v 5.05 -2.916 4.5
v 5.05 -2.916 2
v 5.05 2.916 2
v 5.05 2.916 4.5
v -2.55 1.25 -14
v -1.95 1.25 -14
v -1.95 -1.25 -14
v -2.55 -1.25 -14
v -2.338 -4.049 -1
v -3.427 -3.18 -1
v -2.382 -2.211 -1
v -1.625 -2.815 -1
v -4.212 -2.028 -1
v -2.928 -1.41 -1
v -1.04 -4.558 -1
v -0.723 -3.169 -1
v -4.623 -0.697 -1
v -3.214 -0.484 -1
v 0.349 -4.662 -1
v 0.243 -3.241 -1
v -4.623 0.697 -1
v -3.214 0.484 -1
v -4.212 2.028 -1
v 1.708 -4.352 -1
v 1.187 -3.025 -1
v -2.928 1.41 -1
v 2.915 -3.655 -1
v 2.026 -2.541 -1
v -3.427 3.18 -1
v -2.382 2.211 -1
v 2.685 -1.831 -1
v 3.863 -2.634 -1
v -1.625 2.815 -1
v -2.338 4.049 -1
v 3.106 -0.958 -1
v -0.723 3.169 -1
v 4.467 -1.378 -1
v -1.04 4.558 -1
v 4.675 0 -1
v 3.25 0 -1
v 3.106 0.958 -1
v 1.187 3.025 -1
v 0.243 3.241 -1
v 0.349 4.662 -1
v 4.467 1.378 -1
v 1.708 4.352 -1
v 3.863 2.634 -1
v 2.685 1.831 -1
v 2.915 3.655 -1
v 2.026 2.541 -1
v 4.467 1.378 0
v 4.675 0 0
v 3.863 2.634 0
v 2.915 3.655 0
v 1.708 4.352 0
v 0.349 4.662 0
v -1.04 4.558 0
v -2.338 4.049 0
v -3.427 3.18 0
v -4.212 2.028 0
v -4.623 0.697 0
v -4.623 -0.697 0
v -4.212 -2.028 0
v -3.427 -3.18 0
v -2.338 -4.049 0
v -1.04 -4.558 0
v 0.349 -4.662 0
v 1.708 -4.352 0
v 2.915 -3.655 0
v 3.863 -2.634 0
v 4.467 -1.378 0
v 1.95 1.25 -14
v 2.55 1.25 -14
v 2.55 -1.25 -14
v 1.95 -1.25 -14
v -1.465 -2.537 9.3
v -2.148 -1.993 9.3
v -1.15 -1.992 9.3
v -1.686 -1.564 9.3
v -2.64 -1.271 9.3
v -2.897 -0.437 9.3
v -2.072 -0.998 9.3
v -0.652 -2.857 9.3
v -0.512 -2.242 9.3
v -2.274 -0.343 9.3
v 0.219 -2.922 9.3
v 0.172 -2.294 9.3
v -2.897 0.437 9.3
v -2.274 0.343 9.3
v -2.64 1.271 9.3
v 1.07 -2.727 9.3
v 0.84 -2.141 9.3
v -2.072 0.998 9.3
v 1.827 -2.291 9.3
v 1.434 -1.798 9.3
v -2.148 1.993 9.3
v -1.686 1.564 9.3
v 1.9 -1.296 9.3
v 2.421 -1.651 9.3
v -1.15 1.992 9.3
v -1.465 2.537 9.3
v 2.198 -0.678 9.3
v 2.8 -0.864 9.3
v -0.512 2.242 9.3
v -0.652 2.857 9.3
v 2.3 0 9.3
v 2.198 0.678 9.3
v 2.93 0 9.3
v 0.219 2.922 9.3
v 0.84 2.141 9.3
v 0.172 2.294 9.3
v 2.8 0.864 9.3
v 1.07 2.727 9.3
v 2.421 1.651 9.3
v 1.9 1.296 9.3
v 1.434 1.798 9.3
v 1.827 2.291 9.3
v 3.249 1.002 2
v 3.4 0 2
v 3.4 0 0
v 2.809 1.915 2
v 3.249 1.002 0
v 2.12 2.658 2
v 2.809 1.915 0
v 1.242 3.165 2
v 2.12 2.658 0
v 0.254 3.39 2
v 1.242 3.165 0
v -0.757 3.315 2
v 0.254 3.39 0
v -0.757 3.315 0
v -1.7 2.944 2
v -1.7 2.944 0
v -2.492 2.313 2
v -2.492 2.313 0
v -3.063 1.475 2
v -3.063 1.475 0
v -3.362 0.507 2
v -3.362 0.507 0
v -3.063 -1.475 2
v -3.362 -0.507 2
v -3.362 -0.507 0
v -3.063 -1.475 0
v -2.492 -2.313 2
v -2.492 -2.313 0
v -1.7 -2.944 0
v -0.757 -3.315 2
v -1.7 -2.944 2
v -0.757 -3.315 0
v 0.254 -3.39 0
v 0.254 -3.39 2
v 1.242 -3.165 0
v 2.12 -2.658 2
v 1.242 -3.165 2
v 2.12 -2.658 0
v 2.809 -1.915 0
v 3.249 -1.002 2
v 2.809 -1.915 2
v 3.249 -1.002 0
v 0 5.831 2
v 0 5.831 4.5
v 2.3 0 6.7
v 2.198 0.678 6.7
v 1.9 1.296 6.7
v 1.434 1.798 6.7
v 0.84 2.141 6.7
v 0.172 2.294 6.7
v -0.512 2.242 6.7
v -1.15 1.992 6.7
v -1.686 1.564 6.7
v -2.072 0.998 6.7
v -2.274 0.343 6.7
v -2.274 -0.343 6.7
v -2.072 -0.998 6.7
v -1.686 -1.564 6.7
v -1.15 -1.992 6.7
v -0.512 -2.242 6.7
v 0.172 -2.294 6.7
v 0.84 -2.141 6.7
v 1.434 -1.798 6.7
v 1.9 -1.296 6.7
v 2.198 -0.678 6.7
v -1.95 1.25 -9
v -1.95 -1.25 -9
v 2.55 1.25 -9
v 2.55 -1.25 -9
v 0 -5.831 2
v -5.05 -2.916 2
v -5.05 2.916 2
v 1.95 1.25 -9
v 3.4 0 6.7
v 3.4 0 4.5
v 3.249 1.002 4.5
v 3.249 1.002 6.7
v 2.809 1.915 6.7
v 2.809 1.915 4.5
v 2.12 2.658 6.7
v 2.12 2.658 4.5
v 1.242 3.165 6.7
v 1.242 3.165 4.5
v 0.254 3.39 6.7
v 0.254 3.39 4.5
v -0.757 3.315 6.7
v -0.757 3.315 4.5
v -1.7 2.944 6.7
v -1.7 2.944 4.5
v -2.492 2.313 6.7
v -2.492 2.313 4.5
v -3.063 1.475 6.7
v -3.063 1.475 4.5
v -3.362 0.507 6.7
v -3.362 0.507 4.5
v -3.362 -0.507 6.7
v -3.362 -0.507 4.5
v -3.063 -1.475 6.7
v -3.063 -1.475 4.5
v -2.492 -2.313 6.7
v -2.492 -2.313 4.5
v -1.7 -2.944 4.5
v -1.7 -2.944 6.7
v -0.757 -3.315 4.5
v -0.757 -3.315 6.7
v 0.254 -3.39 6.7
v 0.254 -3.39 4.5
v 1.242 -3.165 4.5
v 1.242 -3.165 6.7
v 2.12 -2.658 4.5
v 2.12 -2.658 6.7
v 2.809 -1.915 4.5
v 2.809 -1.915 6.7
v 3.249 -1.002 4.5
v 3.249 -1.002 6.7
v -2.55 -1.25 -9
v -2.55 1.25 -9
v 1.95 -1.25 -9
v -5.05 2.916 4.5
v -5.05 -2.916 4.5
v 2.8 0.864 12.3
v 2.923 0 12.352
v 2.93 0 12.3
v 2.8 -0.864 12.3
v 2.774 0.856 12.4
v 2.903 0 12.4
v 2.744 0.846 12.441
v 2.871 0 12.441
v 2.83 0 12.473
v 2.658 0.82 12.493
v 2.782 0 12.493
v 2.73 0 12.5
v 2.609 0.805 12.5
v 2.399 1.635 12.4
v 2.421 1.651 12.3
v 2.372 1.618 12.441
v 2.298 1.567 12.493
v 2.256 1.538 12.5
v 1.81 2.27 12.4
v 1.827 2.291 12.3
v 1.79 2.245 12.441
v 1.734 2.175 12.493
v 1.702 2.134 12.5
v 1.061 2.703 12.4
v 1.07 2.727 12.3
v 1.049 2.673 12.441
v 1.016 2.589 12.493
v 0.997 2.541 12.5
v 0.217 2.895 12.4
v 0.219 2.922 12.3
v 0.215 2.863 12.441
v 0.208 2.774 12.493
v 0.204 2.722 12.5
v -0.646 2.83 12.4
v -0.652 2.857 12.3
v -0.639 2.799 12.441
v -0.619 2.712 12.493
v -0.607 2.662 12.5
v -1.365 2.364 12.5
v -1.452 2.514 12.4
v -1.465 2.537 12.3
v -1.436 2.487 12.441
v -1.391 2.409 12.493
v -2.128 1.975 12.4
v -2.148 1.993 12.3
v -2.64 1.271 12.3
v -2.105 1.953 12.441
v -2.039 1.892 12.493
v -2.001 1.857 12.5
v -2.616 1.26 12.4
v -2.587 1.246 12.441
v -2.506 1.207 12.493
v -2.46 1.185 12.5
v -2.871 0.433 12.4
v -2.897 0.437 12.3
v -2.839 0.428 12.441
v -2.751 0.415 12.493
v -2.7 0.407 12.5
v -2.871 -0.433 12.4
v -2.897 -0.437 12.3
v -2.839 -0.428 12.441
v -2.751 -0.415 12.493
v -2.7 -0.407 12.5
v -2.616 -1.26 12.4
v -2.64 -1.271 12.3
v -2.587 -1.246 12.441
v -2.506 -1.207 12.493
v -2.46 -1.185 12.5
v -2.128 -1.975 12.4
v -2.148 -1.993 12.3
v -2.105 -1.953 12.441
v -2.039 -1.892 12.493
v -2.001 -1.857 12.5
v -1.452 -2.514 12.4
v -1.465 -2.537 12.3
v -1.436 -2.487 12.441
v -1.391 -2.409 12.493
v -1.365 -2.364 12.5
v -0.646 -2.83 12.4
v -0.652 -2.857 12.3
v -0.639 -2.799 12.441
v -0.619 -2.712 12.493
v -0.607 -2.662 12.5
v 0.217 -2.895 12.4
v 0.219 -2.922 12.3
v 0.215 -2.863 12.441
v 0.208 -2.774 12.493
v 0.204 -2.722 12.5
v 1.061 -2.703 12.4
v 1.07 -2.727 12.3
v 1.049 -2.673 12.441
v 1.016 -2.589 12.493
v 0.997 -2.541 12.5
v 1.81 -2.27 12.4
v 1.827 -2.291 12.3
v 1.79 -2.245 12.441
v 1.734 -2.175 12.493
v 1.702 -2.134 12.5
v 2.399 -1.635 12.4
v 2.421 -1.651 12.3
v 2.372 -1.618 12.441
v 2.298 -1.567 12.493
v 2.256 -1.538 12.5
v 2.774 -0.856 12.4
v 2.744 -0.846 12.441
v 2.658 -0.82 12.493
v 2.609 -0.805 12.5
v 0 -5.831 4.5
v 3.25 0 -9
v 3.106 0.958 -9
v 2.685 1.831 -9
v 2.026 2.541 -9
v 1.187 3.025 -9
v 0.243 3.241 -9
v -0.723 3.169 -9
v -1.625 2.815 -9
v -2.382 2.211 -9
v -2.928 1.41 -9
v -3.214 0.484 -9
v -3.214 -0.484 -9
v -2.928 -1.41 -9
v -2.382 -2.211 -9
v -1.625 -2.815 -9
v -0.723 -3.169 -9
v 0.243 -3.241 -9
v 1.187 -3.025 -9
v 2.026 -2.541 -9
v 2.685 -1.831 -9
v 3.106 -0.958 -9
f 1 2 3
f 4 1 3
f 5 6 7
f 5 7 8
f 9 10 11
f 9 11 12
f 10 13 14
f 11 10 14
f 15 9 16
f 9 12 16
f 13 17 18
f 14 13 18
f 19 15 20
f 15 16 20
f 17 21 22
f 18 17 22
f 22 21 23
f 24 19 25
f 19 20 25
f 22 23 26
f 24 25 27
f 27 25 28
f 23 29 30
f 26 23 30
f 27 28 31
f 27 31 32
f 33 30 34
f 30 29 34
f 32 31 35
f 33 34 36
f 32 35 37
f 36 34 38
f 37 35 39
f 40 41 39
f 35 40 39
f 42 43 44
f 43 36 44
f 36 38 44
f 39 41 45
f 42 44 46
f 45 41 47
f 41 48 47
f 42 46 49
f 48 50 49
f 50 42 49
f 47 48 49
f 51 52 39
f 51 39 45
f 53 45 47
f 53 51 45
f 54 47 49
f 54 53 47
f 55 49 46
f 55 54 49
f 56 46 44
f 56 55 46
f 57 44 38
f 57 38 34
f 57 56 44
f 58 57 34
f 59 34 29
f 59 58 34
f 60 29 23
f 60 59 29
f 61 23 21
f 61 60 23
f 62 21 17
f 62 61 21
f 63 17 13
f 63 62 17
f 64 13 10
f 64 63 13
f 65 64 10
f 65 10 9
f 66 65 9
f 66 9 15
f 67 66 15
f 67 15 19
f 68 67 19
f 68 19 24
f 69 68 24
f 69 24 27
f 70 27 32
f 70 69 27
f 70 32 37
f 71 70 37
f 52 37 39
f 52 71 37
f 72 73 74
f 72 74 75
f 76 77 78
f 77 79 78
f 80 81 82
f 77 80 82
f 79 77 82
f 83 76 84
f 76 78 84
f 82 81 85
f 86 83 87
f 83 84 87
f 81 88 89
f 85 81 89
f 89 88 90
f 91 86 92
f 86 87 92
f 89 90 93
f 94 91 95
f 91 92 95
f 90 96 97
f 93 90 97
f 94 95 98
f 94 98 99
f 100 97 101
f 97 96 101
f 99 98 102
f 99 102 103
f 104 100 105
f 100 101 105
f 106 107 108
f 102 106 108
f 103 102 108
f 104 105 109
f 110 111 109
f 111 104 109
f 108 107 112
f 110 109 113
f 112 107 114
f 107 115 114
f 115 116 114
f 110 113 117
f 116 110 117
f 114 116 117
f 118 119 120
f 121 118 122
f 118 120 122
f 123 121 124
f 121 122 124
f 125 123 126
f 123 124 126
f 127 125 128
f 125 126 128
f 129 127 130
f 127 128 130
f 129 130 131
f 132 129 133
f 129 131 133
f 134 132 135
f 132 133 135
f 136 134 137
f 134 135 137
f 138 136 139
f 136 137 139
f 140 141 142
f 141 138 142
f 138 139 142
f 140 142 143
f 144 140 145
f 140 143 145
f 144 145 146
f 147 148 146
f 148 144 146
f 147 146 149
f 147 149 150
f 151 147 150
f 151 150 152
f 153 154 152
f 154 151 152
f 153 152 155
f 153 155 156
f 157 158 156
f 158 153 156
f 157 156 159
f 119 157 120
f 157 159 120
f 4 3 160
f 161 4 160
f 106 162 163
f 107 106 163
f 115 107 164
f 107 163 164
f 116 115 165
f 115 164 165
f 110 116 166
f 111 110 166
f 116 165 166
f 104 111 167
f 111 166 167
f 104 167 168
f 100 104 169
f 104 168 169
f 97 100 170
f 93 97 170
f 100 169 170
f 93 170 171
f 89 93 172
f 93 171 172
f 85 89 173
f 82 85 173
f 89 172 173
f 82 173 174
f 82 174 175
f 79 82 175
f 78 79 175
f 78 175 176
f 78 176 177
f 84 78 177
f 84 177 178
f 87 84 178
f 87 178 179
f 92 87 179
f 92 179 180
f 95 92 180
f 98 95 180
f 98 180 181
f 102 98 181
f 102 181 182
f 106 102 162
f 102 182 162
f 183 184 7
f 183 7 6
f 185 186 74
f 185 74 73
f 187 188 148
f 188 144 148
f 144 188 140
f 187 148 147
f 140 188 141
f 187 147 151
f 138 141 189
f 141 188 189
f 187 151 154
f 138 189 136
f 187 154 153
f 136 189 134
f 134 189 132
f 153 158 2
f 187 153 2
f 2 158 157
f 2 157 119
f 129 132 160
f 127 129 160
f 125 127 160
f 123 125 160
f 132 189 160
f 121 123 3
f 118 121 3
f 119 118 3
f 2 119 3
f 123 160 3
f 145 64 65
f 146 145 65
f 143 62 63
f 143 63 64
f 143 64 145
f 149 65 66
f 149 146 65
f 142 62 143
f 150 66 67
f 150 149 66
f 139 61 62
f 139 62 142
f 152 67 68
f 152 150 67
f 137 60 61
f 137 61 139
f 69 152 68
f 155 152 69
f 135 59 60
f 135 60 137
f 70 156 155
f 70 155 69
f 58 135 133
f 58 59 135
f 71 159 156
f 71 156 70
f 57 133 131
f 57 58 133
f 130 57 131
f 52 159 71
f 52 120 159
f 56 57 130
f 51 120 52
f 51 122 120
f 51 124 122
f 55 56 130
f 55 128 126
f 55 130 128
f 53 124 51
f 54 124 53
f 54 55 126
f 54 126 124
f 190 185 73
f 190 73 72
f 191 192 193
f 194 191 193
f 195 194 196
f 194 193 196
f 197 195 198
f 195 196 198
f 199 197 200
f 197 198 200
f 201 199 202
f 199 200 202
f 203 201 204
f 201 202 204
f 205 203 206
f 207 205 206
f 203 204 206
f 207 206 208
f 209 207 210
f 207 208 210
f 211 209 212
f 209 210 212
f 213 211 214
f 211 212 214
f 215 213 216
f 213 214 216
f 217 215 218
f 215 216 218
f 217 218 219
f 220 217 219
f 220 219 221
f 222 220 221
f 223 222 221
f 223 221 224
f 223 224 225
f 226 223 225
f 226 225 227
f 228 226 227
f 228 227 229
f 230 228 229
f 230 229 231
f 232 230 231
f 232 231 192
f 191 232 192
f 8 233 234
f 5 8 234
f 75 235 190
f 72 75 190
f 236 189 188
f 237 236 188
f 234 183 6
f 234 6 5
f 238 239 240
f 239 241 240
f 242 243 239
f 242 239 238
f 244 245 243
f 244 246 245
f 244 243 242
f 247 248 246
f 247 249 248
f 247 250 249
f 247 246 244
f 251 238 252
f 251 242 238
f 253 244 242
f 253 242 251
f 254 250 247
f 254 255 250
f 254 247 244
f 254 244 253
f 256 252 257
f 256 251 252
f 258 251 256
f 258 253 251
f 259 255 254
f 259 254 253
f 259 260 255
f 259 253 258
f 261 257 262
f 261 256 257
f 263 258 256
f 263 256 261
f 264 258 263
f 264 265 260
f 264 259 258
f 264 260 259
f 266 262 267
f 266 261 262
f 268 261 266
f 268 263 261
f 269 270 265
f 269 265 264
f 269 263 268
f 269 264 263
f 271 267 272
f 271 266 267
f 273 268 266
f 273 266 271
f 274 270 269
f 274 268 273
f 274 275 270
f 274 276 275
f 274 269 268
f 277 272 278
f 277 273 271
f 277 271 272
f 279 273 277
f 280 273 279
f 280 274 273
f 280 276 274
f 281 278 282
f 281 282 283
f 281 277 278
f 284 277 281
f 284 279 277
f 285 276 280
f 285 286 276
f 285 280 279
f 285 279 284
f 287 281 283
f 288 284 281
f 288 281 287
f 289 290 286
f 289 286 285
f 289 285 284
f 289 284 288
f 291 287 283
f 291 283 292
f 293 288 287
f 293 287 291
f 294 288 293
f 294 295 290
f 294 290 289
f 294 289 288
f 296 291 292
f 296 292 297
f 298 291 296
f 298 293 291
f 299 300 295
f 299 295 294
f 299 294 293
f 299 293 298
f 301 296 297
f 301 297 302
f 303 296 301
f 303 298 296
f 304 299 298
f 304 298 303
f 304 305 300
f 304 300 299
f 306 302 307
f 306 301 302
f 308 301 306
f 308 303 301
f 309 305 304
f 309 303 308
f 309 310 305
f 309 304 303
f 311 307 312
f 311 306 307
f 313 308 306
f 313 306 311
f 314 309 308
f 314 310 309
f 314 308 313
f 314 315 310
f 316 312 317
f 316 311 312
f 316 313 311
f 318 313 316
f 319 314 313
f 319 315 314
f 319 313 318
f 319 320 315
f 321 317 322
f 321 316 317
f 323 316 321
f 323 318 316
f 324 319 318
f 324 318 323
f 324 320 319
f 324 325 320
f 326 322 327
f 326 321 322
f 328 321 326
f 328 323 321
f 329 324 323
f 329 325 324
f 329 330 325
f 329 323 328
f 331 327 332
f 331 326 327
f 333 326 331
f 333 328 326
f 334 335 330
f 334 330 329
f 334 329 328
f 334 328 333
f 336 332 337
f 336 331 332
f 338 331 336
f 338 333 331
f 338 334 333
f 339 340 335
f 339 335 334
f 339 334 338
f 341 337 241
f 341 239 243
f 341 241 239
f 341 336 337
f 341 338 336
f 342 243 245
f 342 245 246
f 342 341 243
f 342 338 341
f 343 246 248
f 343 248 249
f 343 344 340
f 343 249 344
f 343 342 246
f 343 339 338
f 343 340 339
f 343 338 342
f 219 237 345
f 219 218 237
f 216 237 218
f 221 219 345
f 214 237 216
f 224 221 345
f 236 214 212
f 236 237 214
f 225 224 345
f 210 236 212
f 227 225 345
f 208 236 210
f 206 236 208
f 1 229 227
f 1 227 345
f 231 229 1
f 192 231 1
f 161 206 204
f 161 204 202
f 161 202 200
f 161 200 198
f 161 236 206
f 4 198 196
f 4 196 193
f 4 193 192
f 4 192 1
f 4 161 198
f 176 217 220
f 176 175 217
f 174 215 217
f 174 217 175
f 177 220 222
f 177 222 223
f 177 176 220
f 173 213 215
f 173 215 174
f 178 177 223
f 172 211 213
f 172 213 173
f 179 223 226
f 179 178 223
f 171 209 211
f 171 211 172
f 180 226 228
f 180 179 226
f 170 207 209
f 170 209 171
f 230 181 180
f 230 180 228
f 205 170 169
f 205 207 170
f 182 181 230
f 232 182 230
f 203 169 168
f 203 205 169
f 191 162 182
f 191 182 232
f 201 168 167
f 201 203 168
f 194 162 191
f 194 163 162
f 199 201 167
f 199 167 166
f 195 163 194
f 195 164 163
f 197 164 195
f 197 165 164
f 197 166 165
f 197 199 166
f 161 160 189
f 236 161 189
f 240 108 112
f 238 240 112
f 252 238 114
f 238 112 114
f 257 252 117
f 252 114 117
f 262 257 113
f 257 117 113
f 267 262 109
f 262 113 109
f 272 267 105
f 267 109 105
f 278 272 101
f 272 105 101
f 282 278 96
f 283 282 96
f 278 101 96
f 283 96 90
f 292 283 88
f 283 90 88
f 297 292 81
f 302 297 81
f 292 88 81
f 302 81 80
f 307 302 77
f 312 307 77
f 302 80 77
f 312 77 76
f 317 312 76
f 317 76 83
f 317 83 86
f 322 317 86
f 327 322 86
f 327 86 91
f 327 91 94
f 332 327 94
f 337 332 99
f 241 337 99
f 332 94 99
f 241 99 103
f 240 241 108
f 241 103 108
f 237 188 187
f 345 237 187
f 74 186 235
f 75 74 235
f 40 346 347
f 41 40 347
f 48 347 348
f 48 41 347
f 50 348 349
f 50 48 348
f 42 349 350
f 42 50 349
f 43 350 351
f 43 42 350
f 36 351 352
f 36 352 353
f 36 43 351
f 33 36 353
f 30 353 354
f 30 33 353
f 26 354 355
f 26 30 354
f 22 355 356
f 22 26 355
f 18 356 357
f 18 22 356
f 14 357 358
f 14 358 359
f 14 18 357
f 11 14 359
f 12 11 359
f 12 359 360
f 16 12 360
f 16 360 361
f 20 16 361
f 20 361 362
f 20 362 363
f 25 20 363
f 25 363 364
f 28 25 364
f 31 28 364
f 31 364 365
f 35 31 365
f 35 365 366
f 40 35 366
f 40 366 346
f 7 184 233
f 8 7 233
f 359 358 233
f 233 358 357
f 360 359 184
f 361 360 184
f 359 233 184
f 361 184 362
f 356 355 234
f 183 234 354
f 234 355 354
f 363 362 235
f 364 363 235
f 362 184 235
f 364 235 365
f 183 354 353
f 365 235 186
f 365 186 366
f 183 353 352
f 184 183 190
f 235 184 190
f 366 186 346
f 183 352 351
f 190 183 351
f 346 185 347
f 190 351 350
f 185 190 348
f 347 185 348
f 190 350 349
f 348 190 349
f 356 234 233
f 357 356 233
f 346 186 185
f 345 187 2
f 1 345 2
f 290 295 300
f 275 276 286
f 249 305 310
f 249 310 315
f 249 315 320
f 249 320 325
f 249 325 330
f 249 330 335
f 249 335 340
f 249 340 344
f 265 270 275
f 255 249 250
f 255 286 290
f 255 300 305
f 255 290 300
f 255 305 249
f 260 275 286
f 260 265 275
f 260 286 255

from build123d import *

# Parameters (mm, degrees)
SKETCH1_R        = 4.675
COLLAR_DEPTH     = 1
SKETCH2_R        = 3.4
FRONT_BODY_DEPTH = 6.7
SKETCH4_R        = 2.3
SHAFT_DEPTH      = 2.6
SKETCH5_R        = 2.93
KNOB_DEPTH       = 3.2
KNOB_FILLET_R    = 0.2
SKETCH3_R        = 3.25
REAR_BODY_DEPTH  = 9
SKETCH6_W        = 0.6
SKETCH6_H        = 2.5
PINS_DEPTH       = 5
NUT_DEPTH        = 2.5


with BuildPart() as part:
    # Sketch1 → Collar (new body)
    with BuildSketch(Plane.XY):
        Circle(SKETCH1_R)
    extrude(amount=-COLLAR_DEPTH)

    # Sketch2 → Front Body (add)
    with BuildSketch(Plane.XY):
        Circle(SKETCH2_R)
    extrude(amount=FRONT_BODY_DEPTH)

    # Sketch4 → Shaft (add)
    with BuildSketch(Plane.XY.offset(6.7)):
        Circle(SKETCH4_R)
    extrude(amount=SHAFT_DEPTH)

    # Sketch5 → Knob (add)
    with BuildSketch(Plane.XY.offset(9.3)):
        Circle(SKETCH5_R)
    extrude(amount=KNOB_DEPTH)

    # Knob Fillet
    knob_fillet_edges = [part.edges().sort_by_distance(p)[0] for p in [
        (-2.93, 0, 12.5),
    ]]
    fillet(knob_fillet_edges, radius=KNOB_FILLET_R)

    # Sketch3 → Rear Body (add)
    with BuildSketch(Plane.XY):
        Circle(SKETCH3_R)
    extrude(amount=-REAR_BODY_DEPTH)

    # Sketch6 → Pins (add)
    with BuildSketch(Plane(origin=(0, 0, -9), x_dir=(-1, 0, 0), z_dir=(0, 0, -1))):
        with Locations((-2.25, 0)):
            Rectangle(SKETCH6_W, SKETCH6_H)
        with Locations((2.25, 0)):
            Rectangle(SKETCH6_W, SKETCH6_H)
    extrude(amount=PINS_DEPTH)

    # Sketch7 → Nut (add)
    with BuildSketch(Plane.XY.offset(2)):
        Polygon((0, 5.831237719), (-5.05, 2.915618859), (-5.05, -2.915618859), (0, -5.831237719), (5.05, -2.915618859), (5.05, 2.915618859), align=None)
    extrude(amount=NUT_DEPTH)


solid = part.part
